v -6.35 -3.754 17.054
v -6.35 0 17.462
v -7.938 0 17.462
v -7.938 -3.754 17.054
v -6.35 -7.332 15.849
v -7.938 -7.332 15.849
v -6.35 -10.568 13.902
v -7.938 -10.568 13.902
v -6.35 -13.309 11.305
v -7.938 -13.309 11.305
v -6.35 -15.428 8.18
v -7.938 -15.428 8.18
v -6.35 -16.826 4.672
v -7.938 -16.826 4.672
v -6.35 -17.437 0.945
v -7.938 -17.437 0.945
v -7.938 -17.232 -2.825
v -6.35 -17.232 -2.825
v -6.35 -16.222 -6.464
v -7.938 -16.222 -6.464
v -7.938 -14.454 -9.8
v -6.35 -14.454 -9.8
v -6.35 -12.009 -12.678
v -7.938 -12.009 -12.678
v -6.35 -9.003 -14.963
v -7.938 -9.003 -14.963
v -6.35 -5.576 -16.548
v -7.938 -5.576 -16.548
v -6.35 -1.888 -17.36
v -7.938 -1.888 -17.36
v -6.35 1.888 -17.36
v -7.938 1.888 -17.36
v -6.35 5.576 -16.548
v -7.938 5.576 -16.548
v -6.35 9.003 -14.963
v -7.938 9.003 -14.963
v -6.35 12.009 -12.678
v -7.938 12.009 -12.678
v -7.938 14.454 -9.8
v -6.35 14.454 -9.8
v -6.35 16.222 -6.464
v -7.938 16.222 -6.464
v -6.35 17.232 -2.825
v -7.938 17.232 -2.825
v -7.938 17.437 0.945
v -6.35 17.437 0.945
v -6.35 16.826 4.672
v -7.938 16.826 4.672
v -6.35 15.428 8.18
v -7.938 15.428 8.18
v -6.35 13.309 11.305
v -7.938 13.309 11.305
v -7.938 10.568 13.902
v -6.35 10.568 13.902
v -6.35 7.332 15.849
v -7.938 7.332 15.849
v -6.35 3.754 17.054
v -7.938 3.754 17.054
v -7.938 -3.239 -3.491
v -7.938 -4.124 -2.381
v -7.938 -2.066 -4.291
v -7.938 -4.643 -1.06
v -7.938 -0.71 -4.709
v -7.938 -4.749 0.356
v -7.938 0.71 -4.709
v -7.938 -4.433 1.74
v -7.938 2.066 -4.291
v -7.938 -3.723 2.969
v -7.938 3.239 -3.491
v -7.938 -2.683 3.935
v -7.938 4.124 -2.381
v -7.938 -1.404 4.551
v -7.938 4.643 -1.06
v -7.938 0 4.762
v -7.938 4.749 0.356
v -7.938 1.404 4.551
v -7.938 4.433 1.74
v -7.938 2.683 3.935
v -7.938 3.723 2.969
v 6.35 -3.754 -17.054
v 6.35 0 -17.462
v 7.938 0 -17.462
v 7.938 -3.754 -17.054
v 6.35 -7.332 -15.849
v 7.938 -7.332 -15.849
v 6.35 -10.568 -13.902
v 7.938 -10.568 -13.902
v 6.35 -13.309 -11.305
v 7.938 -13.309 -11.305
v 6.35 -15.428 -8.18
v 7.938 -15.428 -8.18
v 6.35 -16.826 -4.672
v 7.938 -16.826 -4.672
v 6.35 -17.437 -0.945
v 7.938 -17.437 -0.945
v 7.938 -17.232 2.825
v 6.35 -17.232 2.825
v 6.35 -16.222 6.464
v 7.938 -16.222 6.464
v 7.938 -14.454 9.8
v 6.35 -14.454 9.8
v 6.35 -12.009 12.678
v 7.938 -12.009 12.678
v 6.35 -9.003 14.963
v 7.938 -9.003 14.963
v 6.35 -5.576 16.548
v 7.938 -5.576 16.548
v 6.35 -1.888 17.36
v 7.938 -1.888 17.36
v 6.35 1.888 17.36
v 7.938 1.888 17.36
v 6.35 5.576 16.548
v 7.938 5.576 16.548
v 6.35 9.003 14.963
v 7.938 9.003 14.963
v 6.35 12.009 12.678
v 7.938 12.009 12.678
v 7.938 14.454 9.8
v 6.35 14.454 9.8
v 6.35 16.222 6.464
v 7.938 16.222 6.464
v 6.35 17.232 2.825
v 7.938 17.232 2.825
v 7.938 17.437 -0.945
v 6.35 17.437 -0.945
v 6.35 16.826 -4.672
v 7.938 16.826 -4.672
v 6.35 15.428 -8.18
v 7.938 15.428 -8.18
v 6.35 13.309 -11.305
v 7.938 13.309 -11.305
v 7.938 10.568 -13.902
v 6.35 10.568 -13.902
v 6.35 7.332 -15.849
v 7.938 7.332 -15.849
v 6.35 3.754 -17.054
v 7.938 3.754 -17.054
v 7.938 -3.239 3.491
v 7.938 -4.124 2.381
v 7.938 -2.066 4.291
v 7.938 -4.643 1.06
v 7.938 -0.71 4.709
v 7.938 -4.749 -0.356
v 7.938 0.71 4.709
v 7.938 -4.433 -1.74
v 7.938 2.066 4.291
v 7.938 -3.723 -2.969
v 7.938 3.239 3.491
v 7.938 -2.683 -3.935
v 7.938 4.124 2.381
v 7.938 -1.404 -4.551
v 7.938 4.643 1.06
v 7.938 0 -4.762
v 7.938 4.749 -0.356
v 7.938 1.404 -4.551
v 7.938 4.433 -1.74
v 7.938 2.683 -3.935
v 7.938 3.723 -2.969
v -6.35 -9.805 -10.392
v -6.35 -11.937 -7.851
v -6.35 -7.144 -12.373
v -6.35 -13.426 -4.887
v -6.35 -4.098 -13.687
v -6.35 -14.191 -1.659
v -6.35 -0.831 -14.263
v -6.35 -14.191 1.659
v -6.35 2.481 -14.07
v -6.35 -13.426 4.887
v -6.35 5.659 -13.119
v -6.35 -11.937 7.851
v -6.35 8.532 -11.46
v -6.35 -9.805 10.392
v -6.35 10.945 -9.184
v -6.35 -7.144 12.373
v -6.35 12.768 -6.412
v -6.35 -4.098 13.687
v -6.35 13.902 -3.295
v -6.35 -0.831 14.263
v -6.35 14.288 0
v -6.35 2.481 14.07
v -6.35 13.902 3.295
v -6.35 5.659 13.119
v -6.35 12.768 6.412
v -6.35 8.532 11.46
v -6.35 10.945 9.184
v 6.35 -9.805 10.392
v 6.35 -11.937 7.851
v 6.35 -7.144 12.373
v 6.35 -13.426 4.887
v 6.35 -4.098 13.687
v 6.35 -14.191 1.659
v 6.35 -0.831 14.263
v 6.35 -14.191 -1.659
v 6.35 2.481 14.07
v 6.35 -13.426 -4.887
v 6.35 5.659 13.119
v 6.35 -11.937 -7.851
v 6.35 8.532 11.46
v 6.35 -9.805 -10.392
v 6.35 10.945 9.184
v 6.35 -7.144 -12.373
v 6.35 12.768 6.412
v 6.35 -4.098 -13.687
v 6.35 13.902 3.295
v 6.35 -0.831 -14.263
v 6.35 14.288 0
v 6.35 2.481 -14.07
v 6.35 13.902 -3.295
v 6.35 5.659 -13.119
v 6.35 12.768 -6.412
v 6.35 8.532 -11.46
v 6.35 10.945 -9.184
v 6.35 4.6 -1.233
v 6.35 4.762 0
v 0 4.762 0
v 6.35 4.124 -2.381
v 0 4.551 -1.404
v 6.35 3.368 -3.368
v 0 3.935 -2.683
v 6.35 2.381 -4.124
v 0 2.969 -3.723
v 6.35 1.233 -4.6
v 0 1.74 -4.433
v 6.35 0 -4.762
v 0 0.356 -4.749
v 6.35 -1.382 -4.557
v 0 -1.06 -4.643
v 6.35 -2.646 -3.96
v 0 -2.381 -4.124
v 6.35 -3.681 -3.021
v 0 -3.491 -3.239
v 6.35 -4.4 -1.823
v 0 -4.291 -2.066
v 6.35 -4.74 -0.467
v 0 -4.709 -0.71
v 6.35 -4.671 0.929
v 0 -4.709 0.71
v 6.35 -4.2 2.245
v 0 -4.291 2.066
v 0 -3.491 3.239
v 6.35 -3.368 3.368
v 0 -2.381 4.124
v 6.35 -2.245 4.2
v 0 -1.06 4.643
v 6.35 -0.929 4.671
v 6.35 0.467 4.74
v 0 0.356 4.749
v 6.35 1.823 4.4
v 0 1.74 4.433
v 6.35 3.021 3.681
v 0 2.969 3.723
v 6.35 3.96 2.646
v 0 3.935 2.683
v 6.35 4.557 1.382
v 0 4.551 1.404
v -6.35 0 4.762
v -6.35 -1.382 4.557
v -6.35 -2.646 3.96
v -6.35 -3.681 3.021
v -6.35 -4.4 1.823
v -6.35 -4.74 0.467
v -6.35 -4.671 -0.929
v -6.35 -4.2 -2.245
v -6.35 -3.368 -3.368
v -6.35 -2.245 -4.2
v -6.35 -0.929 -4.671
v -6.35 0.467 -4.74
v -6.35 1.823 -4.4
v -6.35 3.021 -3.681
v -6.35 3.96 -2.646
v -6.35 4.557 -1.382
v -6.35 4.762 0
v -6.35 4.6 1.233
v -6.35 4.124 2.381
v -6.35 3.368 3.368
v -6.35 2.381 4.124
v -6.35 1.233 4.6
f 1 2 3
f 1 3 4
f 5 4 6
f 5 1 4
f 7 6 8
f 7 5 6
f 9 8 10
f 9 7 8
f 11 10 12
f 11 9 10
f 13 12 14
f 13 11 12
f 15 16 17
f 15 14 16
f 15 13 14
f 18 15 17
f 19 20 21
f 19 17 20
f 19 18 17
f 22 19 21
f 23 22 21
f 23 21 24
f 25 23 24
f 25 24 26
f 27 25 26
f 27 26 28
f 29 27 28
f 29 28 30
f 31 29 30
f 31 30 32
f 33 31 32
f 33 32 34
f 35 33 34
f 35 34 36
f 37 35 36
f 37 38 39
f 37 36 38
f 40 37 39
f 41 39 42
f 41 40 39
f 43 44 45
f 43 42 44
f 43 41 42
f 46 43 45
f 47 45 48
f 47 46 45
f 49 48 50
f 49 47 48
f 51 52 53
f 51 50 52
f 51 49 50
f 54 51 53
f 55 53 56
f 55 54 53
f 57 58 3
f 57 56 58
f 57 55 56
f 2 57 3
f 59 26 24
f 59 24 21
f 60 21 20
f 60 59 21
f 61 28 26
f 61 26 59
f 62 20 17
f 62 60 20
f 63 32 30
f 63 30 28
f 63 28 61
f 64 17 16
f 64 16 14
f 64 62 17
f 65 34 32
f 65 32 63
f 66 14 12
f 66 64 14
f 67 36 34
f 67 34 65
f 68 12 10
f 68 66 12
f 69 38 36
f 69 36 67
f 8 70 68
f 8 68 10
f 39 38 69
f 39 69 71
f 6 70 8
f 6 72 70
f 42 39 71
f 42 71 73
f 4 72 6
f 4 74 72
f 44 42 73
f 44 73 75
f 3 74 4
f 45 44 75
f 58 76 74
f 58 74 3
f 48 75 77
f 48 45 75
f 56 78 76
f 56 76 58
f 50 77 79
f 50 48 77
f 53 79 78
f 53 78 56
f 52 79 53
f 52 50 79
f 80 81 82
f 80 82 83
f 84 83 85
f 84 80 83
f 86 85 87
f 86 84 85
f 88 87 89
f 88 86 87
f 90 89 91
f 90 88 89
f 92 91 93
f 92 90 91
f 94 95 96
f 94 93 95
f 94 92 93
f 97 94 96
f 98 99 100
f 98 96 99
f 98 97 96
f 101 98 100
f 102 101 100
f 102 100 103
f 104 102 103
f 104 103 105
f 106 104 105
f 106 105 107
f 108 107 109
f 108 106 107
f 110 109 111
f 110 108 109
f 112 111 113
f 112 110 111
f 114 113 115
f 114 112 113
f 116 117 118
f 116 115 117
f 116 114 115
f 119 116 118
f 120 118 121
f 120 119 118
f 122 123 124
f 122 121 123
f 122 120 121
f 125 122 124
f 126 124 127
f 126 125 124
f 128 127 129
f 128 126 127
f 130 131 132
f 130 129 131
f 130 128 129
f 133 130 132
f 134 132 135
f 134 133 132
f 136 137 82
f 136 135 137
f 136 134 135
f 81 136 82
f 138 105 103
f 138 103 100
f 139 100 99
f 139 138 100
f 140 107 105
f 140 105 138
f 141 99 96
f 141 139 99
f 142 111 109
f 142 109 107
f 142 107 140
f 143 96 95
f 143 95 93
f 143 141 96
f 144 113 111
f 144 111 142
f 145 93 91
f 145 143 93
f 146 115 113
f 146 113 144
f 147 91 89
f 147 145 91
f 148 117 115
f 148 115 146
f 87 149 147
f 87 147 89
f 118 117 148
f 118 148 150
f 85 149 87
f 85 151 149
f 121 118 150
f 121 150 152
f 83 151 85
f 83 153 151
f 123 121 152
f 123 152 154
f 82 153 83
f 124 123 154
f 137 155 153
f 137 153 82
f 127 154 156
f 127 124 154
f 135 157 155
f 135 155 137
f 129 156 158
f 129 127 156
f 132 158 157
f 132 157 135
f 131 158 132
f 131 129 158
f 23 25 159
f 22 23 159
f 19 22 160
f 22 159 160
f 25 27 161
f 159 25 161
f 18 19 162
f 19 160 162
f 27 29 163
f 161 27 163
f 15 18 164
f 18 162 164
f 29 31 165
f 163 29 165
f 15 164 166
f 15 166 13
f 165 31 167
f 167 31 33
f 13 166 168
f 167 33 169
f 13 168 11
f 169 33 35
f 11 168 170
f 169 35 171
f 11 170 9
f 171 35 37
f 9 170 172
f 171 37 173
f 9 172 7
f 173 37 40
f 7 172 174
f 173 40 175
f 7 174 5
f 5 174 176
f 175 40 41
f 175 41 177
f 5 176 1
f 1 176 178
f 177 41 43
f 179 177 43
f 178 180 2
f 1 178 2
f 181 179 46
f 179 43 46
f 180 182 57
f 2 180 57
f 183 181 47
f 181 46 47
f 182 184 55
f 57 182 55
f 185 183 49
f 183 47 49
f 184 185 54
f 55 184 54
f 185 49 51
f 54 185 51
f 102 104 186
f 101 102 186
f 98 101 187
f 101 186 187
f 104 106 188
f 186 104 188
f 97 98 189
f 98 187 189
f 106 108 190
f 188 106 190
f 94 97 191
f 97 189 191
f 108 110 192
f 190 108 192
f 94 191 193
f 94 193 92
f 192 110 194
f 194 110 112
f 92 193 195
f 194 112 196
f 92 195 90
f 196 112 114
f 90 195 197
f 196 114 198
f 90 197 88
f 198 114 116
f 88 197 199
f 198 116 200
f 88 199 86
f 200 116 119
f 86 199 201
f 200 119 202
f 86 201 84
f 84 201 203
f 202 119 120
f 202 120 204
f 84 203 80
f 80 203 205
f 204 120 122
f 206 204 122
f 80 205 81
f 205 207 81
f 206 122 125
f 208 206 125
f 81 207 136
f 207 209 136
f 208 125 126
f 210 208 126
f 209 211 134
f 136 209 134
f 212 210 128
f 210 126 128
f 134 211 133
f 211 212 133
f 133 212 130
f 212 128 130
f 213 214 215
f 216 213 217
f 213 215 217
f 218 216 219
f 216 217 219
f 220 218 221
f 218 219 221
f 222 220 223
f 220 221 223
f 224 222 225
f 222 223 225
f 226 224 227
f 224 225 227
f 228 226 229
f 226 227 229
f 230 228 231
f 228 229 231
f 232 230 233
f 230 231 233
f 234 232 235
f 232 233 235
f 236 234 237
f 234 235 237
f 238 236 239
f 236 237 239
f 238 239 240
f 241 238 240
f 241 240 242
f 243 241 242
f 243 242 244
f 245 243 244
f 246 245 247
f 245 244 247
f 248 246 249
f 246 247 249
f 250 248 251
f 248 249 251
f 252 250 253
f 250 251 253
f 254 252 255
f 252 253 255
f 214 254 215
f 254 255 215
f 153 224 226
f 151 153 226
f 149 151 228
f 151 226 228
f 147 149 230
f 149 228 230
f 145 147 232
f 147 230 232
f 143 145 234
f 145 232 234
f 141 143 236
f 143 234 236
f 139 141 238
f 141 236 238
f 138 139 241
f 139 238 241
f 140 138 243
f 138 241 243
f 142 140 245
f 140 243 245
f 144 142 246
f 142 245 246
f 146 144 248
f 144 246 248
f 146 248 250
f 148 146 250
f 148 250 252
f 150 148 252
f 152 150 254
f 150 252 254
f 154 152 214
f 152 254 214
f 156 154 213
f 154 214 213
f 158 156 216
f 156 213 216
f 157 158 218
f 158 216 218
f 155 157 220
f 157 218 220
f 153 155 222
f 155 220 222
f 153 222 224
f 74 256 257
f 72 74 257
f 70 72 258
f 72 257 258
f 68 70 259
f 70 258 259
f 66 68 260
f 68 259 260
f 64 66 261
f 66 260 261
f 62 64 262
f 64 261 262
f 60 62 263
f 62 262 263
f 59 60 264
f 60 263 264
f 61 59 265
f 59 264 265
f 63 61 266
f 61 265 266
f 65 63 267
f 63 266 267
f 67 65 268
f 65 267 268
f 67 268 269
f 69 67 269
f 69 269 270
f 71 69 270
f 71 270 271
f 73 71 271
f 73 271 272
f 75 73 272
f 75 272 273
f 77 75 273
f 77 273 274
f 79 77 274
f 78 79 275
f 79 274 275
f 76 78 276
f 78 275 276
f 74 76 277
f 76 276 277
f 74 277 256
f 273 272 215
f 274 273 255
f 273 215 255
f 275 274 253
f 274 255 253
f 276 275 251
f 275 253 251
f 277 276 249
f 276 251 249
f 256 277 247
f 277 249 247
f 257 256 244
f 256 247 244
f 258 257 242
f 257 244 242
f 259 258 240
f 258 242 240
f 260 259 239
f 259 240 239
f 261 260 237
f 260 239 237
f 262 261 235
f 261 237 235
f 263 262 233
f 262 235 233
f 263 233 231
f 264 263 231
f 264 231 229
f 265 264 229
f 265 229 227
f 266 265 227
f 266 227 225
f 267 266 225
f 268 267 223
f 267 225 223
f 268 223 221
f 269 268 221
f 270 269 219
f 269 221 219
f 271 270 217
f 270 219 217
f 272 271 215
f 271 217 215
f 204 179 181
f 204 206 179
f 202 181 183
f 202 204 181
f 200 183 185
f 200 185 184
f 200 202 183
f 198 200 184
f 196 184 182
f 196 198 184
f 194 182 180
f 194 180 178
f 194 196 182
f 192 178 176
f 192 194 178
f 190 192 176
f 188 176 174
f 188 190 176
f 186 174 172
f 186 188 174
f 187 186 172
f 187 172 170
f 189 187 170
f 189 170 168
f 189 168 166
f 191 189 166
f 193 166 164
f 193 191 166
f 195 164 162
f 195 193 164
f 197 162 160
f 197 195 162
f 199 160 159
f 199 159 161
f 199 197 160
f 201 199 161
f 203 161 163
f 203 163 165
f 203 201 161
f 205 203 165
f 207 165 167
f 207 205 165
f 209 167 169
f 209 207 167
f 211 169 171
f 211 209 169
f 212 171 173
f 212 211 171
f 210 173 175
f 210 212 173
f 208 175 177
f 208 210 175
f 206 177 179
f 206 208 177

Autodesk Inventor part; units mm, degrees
ref_plane "YZ Plane" through (0, 0, 0) normal (1, 0, 0) x (0, 1, 0)
ref_plane "XZ Plane" through (0, 0, 0) normal (0, 1, 0) x (-1, 0, 0)
ref_plane "XY Plane" through (0, 0, 0) normal (0, 0, 1) x (1, 0, 0)
sketch "Sketch1" plane through (0, 0, 0) normal (1, 0, 0) x (0, 1, 0)
  circle A0 centre (0, 0) radius 14.2875
  circle A1 centre (0, 0) radius 4.7625
  dimension "d0" = 28.575
  dimension "d2" = 9.525
extrude "Extrusion1" add sketch "Sketch1" along normal mid plane 12.7
sketch "Sketch2" plane through (6.35, 0, 0) normal (1, 0, 0) x (0, 0, -1)
  circle A0 centre (0, 0) radius 17.4625
  circle A1 centre (0, 0) radius 14.2875 construction
  circle A2 centre (0, 0) radius 4.7625 projected
  dimension "d6" = 3.175
extrude "Extrusion2" add sketch "Sketch2" along normal blind 1.5875
sketch "Sketch3" plane through (-6.35, 0, 0) normal (-1, 0, 0) x (0, 0, 1)
  circle A0 centre (0, 0) radius 17.4625 projected
  circle A1 centre (0, 0) radius 4.7625 projected
extrude "Extrusion3" add sketch "Sketch3" along normal blind 1.5875
sketch "Sketch4" plane through (7.9375, 0, 0) normal (1, 0, 0) x (0, 0, -1)
  circle A0 centre (0, 0) radius 4.7625 projected
  circle A1 centre (0, 0) radius 9.525
  dimension "d11" = 4.7625
extrude "Extrusion4" [suppressed]
properties part number "pulley XL 1.375in 2" material "Nylon 6/6"
